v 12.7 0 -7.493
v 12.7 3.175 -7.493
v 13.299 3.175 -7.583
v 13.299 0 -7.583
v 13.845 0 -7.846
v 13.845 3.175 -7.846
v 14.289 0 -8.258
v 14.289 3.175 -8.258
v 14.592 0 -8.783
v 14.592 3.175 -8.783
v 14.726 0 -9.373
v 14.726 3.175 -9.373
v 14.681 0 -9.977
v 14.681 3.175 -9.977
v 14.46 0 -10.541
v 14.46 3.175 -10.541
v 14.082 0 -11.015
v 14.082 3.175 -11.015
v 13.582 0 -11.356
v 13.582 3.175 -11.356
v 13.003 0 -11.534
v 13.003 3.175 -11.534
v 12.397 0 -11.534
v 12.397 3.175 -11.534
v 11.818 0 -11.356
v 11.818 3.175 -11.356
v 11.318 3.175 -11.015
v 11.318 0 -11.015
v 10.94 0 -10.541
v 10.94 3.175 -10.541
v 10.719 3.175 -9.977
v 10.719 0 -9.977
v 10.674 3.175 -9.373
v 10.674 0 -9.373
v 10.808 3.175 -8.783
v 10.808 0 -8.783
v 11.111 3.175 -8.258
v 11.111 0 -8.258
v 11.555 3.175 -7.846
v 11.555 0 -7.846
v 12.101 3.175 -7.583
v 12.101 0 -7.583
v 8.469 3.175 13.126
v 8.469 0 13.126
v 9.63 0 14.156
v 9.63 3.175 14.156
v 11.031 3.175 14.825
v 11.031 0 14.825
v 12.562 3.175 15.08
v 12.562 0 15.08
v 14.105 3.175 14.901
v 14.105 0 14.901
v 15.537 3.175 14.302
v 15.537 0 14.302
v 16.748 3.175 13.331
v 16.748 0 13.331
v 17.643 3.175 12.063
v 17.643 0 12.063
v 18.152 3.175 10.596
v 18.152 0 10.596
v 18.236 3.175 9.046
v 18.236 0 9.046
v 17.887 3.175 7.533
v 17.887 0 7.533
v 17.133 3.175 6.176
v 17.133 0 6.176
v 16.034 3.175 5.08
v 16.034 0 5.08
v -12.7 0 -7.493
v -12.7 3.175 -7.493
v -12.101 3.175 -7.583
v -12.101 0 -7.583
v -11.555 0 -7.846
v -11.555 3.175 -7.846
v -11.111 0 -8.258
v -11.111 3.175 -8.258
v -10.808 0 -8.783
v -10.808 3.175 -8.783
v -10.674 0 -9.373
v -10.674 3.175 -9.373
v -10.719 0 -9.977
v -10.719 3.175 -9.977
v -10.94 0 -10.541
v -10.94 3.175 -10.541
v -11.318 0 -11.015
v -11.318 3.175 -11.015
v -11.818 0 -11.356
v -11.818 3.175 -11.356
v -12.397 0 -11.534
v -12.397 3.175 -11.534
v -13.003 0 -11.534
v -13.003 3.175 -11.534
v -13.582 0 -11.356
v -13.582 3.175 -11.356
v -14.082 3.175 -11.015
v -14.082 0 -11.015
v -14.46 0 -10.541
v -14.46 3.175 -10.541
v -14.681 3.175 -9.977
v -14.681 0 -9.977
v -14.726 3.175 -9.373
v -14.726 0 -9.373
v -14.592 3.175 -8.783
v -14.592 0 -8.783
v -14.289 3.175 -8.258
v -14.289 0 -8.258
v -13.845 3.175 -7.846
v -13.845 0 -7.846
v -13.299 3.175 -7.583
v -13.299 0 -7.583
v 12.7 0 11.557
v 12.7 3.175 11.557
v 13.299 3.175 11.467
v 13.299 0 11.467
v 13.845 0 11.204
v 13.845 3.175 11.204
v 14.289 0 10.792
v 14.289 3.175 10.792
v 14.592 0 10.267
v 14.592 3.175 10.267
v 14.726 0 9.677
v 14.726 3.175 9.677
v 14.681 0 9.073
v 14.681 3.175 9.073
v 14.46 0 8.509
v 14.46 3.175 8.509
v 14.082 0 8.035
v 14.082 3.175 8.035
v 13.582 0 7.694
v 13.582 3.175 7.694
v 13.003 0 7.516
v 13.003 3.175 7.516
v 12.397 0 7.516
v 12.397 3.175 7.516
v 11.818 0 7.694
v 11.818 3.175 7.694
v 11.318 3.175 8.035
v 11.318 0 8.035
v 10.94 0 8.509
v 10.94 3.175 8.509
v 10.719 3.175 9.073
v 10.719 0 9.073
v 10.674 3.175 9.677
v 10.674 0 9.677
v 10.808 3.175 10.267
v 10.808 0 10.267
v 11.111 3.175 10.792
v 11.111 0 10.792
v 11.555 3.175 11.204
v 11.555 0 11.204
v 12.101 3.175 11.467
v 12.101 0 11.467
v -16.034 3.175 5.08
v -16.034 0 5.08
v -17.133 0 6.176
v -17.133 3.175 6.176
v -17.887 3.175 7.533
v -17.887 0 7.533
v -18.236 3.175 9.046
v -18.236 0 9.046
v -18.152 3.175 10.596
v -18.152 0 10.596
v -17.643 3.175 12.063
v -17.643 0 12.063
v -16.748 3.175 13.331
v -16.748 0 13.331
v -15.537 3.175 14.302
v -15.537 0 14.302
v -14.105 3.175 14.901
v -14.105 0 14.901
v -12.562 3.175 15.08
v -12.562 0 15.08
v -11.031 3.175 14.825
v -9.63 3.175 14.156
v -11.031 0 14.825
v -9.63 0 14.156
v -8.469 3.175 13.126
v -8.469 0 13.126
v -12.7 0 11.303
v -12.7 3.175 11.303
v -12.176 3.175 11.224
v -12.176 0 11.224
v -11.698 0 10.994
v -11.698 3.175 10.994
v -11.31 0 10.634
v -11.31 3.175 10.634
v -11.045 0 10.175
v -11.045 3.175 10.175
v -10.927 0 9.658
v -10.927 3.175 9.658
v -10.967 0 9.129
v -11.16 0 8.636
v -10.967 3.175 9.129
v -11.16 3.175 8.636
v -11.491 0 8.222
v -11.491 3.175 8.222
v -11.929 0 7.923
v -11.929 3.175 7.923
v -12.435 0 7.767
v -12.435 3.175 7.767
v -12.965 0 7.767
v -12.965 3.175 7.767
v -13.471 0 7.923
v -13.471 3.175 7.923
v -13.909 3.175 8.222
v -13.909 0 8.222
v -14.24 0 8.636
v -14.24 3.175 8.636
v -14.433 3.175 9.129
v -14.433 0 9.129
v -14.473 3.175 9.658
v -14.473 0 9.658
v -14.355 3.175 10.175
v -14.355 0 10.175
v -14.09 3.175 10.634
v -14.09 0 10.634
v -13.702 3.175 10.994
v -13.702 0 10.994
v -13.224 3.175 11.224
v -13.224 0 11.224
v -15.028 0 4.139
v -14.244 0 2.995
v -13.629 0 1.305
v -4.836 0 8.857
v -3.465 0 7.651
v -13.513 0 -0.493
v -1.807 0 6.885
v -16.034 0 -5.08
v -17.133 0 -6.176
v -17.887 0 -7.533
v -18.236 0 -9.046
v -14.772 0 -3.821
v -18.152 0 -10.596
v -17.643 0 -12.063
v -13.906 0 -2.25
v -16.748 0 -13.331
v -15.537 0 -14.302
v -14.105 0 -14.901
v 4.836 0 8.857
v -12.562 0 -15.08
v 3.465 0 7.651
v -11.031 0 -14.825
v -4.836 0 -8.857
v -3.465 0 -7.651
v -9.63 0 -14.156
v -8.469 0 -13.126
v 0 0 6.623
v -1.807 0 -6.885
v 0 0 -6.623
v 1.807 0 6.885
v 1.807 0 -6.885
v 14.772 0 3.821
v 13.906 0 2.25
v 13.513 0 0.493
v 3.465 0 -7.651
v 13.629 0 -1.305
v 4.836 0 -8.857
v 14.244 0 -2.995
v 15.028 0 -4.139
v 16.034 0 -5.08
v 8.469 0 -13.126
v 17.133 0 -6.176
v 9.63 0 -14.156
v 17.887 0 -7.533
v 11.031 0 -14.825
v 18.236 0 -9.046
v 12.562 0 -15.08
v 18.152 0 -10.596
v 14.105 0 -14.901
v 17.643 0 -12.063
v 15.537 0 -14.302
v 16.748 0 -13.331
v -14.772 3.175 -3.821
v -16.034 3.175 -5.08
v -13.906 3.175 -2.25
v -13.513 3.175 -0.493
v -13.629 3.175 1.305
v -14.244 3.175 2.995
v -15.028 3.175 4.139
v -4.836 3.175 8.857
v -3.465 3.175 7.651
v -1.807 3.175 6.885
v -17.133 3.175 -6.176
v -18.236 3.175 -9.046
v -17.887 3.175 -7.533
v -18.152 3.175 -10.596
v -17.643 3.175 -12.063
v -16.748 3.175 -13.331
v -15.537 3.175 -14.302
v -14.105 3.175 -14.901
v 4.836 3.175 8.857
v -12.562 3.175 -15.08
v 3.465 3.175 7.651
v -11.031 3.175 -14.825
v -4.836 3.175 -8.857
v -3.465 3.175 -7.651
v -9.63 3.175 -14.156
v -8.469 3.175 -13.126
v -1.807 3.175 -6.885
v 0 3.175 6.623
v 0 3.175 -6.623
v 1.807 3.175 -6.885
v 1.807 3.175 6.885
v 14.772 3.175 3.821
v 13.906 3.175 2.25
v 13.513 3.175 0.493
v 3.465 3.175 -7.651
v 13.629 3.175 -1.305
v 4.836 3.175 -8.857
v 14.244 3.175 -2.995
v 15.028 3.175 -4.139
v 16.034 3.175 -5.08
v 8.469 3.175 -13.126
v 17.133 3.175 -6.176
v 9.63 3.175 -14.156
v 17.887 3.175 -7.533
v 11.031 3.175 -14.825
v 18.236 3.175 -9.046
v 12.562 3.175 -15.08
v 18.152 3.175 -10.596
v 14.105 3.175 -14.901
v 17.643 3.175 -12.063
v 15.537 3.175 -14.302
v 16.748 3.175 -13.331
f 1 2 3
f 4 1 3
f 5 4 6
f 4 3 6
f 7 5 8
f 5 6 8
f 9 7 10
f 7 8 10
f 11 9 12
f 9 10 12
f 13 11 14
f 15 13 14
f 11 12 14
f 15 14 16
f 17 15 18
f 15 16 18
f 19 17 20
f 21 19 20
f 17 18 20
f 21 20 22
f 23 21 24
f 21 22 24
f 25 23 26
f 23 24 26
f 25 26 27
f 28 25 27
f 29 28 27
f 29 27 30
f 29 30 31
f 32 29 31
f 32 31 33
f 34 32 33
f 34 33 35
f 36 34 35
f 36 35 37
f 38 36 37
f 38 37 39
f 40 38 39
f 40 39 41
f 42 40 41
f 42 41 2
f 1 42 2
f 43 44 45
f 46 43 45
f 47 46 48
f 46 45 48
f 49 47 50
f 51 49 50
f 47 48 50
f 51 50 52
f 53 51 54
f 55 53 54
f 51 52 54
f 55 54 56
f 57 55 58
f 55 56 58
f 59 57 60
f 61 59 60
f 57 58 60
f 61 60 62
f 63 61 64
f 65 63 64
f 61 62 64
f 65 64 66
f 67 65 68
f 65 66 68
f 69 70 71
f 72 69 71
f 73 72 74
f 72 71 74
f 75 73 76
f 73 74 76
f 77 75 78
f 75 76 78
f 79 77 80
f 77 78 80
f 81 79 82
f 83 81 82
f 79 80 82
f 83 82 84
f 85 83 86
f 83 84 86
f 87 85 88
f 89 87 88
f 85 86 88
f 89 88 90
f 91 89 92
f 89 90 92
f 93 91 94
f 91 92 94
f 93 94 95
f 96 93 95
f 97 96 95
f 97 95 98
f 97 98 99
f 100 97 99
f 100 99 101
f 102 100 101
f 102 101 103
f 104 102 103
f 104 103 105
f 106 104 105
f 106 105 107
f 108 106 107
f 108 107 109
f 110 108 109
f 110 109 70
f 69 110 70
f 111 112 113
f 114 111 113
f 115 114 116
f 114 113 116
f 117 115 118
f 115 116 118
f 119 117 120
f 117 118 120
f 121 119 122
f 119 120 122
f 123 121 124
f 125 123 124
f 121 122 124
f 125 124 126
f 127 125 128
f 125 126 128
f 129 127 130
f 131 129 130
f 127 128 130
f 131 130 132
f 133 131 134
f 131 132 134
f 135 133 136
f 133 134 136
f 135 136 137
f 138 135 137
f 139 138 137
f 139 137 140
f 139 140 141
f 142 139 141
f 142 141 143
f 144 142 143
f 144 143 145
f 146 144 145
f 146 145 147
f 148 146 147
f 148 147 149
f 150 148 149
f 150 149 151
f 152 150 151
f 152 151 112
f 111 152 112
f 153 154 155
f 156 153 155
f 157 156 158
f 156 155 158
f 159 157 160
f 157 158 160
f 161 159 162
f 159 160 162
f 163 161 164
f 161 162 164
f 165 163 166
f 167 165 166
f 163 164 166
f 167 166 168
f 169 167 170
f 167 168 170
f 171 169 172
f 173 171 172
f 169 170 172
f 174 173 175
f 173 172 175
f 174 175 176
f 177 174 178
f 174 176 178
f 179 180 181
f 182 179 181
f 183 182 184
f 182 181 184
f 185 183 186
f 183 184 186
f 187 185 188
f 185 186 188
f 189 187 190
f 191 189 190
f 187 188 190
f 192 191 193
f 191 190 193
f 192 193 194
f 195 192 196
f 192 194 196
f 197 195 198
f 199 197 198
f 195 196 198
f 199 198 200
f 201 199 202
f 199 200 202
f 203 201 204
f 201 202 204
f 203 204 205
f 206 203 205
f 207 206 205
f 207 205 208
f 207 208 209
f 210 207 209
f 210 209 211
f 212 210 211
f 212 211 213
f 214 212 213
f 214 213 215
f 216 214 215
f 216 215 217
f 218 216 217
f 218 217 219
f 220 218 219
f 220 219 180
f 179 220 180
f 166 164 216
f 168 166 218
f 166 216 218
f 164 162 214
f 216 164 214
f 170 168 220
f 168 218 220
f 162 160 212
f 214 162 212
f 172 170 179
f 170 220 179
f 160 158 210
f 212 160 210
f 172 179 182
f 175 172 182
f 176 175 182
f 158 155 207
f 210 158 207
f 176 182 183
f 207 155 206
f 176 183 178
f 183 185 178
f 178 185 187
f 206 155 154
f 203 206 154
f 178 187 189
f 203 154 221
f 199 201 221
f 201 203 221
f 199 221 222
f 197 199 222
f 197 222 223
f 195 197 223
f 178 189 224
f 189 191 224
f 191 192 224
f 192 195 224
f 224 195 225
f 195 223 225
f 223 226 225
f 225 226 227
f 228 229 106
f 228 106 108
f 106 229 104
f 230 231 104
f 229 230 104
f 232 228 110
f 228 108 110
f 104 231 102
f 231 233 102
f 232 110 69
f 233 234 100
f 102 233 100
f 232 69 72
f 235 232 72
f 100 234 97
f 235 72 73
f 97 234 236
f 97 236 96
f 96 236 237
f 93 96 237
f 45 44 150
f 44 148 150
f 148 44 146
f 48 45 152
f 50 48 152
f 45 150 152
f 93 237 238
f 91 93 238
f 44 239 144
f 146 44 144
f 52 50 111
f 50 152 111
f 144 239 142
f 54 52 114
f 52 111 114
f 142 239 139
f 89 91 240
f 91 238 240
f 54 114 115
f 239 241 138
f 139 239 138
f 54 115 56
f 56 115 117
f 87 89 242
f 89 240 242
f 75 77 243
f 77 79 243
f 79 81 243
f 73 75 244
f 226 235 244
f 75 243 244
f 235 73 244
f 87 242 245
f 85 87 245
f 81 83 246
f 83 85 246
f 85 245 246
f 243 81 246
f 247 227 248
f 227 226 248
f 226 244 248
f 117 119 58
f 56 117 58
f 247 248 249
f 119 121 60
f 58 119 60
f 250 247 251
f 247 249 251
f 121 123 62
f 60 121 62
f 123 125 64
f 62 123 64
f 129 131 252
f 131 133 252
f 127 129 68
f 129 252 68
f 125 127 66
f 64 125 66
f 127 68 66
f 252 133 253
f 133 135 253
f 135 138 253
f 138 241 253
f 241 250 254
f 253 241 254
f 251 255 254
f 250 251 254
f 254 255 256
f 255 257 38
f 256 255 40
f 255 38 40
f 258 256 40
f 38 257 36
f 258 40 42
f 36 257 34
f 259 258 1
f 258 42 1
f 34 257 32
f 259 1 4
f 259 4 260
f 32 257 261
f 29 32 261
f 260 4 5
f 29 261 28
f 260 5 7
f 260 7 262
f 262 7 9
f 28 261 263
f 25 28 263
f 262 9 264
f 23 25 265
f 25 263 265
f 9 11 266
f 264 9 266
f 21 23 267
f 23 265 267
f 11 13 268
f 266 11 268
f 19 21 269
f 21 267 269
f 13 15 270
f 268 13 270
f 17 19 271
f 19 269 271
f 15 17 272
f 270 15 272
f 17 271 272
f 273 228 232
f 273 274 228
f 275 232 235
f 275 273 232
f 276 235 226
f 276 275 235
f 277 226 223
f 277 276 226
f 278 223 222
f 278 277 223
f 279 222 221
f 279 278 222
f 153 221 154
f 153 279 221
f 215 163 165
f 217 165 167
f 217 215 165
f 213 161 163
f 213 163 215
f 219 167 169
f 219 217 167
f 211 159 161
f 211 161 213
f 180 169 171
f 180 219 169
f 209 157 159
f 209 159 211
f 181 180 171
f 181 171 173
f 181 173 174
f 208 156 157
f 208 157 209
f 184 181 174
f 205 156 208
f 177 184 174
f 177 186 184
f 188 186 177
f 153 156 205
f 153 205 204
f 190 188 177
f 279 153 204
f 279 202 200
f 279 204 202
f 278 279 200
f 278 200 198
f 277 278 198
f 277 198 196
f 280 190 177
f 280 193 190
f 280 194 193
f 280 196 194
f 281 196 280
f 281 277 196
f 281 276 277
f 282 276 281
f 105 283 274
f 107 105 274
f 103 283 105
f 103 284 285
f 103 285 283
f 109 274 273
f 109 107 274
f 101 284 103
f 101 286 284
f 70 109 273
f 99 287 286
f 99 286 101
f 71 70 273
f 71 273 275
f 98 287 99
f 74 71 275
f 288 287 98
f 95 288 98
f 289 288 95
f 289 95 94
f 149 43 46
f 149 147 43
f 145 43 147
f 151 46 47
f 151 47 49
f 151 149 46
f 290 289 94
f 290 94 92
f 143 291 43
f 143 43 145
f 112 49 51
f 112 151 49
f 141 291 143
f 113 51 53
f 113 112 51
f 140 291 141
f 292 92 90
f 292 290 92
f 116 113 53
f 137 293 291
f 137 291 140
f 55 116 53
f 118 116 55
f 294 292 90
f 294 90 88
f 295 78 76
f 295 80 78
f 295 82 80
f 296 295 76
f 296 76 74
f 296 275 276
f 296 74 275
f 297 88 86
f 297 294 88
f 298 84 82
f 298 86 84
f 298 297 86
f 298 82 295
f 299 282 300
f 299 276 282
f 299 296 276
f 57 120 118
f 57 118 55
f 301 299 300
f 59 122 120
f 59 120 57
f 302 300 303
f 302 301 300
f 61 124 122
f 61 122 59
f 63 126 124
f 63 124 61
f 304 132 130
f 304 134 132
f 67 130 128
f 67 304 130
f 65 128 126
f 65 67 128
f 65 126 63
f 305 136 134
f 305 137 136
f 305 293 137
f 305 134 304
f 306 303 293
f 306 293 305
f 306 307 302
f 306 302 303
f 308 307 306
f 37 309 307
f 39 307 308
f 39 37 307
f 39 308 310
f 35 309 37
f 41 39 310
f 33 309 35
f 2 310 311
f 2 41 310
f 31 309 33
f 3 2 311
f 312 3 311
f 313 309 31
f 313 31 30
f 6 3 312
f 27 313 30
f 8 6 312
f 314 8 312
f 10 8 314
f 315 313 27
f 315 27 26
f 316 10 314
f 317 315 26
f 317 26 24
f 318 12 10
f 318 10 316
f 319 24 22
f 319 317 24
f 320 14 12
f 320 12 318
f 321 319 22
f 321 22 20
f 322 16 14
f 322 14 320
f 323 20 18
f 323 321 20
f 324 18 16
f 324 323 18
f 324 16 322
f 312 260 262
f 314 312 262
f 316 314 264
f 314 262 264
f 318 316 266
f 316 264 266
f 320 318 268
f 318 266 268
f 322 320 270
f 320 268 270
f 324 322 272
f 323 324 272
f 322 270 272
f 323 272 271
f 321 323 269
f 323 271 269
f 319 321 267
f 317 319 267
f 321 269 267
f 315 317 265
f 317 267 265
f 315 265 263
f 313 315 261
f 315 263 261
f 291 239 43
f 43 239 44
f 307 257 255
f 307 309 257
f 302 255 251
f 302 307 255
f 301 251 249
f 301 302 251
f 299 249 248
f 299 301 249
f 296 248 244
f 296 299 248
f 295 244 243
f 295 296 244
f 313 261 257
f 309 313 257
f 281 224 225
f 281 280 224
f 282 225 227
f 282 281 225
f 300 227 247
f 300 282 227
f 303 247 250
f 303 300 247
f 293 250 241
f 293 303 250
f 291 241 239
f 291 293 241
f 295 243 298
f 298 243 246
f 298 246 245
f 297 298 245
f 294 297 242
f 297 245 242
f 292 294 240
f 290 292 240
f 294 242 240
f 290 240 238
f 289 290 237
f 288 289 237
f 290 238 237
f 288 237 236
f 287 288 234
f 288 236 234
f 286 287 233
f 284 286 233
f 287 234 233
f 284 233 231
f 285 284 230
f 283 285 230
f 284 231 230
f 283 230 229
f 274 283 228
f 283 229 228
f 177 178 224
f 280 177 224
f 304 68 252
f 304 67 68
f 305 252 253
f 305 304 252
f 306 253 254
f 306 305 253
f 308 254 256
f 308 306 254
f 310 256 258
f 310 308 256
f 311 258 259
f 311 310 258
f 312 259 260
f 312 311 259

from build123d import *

# Parameters (mm, degrees)
BOSS_EXTRUDE1_DEPTH = 3.175
FILLET1_R           = 6.35
SKETCH2_R           = 2.032
SKETCH2_R_2         = 1.778
CUT_EXTRUDE1_DEPTH  = 24.8917433


with BuildPart() as part:
    # Sketch1 → Boss-Extrude1 (new body)
    with BuildSketch(Plane(origin=(0, 0, 0), x_dir=(1, 0, 0), z_dir=(0, 1, 0))):
        with BuildLine():
            Line((-8.468627029, -13.126027192), (0, -3.175))
            Line((0, -3.175), (8.468627029, -13.126027192))
            ThreePointArc((8.468627029, -13.126027192), (17.244713502, -12.721481385), (14.65849127, -4.325362897))
            Line((14.65849127, -4.325362897), (3.175, 0))
            Line((3.175, 0), (14.65849127, 4.325362897))
            ThreePointArc((14.65849127, 4.325362897), (17.244713502, 12.721481385), (8.468627029, 13.126027192))
            Line((8.468627029, 13.126027192), (0, 3.175))
            Line((0, 3.175), (-8.468627029, 13.126027192))
            ThreePointArc((-8.468627029, 13.126027192), (-17.244713502, 12.721481385), (-14.65849127, 4.325362897))
            Line((-14.65849127, 4.325362897), (-3.175, 0))
            Line((-3.175, 0), (-14.65849127, -4.325362897))
            ThreePointArc((-14.65849127, -4.325362897), (-17.244713502, -12.721481385), (-8.468627029, -13.126027192))
        make_face()
    extrude(amount=BOSS_EXTRUDE1_DEPTH)

    # Fillet1
    fillet1_edges = [part.edges().sort_by_distance(p)[0] for p in [
        (0, 1.5875, -3.175),
        (-3.175, 1.5875, 0),
        (3.175, 1.5875, 0),
        (0, 1.5875, 3.175),
    ]]
    fillet(fillet1_edges, radius=FILLET1_R)

    # Sketch2 → Cut-Extrude1 (cut, through all)
    with BuildSketch(Plane(origin=(0, 3.175, 0), x_dir=(1, 0, 0), z_dir=(0, 1, 0))):
        with Locations(Location((-12.7, 9.525, 0), (0, 0, 270))):
            Circle(SKETCH2_R)
        with Locations(Location((12.7, 9.525, 0), (0, 0, 270))):
            Circle(SKETCH2_R)
        with Locations(Location((12.7, -9.525, 0), (0, 0, 270))):
            Circle(SKETCH2_R)
        with Locations(Location((-12.7, -9.525, 0), (0, 0, 270))):
            Circle(SKETCH2_R_2)
    extrude(amount=-CUT_EXTRUDE1_DEPTH, mode=Mode.SUBTRACT)


solid = part.part
